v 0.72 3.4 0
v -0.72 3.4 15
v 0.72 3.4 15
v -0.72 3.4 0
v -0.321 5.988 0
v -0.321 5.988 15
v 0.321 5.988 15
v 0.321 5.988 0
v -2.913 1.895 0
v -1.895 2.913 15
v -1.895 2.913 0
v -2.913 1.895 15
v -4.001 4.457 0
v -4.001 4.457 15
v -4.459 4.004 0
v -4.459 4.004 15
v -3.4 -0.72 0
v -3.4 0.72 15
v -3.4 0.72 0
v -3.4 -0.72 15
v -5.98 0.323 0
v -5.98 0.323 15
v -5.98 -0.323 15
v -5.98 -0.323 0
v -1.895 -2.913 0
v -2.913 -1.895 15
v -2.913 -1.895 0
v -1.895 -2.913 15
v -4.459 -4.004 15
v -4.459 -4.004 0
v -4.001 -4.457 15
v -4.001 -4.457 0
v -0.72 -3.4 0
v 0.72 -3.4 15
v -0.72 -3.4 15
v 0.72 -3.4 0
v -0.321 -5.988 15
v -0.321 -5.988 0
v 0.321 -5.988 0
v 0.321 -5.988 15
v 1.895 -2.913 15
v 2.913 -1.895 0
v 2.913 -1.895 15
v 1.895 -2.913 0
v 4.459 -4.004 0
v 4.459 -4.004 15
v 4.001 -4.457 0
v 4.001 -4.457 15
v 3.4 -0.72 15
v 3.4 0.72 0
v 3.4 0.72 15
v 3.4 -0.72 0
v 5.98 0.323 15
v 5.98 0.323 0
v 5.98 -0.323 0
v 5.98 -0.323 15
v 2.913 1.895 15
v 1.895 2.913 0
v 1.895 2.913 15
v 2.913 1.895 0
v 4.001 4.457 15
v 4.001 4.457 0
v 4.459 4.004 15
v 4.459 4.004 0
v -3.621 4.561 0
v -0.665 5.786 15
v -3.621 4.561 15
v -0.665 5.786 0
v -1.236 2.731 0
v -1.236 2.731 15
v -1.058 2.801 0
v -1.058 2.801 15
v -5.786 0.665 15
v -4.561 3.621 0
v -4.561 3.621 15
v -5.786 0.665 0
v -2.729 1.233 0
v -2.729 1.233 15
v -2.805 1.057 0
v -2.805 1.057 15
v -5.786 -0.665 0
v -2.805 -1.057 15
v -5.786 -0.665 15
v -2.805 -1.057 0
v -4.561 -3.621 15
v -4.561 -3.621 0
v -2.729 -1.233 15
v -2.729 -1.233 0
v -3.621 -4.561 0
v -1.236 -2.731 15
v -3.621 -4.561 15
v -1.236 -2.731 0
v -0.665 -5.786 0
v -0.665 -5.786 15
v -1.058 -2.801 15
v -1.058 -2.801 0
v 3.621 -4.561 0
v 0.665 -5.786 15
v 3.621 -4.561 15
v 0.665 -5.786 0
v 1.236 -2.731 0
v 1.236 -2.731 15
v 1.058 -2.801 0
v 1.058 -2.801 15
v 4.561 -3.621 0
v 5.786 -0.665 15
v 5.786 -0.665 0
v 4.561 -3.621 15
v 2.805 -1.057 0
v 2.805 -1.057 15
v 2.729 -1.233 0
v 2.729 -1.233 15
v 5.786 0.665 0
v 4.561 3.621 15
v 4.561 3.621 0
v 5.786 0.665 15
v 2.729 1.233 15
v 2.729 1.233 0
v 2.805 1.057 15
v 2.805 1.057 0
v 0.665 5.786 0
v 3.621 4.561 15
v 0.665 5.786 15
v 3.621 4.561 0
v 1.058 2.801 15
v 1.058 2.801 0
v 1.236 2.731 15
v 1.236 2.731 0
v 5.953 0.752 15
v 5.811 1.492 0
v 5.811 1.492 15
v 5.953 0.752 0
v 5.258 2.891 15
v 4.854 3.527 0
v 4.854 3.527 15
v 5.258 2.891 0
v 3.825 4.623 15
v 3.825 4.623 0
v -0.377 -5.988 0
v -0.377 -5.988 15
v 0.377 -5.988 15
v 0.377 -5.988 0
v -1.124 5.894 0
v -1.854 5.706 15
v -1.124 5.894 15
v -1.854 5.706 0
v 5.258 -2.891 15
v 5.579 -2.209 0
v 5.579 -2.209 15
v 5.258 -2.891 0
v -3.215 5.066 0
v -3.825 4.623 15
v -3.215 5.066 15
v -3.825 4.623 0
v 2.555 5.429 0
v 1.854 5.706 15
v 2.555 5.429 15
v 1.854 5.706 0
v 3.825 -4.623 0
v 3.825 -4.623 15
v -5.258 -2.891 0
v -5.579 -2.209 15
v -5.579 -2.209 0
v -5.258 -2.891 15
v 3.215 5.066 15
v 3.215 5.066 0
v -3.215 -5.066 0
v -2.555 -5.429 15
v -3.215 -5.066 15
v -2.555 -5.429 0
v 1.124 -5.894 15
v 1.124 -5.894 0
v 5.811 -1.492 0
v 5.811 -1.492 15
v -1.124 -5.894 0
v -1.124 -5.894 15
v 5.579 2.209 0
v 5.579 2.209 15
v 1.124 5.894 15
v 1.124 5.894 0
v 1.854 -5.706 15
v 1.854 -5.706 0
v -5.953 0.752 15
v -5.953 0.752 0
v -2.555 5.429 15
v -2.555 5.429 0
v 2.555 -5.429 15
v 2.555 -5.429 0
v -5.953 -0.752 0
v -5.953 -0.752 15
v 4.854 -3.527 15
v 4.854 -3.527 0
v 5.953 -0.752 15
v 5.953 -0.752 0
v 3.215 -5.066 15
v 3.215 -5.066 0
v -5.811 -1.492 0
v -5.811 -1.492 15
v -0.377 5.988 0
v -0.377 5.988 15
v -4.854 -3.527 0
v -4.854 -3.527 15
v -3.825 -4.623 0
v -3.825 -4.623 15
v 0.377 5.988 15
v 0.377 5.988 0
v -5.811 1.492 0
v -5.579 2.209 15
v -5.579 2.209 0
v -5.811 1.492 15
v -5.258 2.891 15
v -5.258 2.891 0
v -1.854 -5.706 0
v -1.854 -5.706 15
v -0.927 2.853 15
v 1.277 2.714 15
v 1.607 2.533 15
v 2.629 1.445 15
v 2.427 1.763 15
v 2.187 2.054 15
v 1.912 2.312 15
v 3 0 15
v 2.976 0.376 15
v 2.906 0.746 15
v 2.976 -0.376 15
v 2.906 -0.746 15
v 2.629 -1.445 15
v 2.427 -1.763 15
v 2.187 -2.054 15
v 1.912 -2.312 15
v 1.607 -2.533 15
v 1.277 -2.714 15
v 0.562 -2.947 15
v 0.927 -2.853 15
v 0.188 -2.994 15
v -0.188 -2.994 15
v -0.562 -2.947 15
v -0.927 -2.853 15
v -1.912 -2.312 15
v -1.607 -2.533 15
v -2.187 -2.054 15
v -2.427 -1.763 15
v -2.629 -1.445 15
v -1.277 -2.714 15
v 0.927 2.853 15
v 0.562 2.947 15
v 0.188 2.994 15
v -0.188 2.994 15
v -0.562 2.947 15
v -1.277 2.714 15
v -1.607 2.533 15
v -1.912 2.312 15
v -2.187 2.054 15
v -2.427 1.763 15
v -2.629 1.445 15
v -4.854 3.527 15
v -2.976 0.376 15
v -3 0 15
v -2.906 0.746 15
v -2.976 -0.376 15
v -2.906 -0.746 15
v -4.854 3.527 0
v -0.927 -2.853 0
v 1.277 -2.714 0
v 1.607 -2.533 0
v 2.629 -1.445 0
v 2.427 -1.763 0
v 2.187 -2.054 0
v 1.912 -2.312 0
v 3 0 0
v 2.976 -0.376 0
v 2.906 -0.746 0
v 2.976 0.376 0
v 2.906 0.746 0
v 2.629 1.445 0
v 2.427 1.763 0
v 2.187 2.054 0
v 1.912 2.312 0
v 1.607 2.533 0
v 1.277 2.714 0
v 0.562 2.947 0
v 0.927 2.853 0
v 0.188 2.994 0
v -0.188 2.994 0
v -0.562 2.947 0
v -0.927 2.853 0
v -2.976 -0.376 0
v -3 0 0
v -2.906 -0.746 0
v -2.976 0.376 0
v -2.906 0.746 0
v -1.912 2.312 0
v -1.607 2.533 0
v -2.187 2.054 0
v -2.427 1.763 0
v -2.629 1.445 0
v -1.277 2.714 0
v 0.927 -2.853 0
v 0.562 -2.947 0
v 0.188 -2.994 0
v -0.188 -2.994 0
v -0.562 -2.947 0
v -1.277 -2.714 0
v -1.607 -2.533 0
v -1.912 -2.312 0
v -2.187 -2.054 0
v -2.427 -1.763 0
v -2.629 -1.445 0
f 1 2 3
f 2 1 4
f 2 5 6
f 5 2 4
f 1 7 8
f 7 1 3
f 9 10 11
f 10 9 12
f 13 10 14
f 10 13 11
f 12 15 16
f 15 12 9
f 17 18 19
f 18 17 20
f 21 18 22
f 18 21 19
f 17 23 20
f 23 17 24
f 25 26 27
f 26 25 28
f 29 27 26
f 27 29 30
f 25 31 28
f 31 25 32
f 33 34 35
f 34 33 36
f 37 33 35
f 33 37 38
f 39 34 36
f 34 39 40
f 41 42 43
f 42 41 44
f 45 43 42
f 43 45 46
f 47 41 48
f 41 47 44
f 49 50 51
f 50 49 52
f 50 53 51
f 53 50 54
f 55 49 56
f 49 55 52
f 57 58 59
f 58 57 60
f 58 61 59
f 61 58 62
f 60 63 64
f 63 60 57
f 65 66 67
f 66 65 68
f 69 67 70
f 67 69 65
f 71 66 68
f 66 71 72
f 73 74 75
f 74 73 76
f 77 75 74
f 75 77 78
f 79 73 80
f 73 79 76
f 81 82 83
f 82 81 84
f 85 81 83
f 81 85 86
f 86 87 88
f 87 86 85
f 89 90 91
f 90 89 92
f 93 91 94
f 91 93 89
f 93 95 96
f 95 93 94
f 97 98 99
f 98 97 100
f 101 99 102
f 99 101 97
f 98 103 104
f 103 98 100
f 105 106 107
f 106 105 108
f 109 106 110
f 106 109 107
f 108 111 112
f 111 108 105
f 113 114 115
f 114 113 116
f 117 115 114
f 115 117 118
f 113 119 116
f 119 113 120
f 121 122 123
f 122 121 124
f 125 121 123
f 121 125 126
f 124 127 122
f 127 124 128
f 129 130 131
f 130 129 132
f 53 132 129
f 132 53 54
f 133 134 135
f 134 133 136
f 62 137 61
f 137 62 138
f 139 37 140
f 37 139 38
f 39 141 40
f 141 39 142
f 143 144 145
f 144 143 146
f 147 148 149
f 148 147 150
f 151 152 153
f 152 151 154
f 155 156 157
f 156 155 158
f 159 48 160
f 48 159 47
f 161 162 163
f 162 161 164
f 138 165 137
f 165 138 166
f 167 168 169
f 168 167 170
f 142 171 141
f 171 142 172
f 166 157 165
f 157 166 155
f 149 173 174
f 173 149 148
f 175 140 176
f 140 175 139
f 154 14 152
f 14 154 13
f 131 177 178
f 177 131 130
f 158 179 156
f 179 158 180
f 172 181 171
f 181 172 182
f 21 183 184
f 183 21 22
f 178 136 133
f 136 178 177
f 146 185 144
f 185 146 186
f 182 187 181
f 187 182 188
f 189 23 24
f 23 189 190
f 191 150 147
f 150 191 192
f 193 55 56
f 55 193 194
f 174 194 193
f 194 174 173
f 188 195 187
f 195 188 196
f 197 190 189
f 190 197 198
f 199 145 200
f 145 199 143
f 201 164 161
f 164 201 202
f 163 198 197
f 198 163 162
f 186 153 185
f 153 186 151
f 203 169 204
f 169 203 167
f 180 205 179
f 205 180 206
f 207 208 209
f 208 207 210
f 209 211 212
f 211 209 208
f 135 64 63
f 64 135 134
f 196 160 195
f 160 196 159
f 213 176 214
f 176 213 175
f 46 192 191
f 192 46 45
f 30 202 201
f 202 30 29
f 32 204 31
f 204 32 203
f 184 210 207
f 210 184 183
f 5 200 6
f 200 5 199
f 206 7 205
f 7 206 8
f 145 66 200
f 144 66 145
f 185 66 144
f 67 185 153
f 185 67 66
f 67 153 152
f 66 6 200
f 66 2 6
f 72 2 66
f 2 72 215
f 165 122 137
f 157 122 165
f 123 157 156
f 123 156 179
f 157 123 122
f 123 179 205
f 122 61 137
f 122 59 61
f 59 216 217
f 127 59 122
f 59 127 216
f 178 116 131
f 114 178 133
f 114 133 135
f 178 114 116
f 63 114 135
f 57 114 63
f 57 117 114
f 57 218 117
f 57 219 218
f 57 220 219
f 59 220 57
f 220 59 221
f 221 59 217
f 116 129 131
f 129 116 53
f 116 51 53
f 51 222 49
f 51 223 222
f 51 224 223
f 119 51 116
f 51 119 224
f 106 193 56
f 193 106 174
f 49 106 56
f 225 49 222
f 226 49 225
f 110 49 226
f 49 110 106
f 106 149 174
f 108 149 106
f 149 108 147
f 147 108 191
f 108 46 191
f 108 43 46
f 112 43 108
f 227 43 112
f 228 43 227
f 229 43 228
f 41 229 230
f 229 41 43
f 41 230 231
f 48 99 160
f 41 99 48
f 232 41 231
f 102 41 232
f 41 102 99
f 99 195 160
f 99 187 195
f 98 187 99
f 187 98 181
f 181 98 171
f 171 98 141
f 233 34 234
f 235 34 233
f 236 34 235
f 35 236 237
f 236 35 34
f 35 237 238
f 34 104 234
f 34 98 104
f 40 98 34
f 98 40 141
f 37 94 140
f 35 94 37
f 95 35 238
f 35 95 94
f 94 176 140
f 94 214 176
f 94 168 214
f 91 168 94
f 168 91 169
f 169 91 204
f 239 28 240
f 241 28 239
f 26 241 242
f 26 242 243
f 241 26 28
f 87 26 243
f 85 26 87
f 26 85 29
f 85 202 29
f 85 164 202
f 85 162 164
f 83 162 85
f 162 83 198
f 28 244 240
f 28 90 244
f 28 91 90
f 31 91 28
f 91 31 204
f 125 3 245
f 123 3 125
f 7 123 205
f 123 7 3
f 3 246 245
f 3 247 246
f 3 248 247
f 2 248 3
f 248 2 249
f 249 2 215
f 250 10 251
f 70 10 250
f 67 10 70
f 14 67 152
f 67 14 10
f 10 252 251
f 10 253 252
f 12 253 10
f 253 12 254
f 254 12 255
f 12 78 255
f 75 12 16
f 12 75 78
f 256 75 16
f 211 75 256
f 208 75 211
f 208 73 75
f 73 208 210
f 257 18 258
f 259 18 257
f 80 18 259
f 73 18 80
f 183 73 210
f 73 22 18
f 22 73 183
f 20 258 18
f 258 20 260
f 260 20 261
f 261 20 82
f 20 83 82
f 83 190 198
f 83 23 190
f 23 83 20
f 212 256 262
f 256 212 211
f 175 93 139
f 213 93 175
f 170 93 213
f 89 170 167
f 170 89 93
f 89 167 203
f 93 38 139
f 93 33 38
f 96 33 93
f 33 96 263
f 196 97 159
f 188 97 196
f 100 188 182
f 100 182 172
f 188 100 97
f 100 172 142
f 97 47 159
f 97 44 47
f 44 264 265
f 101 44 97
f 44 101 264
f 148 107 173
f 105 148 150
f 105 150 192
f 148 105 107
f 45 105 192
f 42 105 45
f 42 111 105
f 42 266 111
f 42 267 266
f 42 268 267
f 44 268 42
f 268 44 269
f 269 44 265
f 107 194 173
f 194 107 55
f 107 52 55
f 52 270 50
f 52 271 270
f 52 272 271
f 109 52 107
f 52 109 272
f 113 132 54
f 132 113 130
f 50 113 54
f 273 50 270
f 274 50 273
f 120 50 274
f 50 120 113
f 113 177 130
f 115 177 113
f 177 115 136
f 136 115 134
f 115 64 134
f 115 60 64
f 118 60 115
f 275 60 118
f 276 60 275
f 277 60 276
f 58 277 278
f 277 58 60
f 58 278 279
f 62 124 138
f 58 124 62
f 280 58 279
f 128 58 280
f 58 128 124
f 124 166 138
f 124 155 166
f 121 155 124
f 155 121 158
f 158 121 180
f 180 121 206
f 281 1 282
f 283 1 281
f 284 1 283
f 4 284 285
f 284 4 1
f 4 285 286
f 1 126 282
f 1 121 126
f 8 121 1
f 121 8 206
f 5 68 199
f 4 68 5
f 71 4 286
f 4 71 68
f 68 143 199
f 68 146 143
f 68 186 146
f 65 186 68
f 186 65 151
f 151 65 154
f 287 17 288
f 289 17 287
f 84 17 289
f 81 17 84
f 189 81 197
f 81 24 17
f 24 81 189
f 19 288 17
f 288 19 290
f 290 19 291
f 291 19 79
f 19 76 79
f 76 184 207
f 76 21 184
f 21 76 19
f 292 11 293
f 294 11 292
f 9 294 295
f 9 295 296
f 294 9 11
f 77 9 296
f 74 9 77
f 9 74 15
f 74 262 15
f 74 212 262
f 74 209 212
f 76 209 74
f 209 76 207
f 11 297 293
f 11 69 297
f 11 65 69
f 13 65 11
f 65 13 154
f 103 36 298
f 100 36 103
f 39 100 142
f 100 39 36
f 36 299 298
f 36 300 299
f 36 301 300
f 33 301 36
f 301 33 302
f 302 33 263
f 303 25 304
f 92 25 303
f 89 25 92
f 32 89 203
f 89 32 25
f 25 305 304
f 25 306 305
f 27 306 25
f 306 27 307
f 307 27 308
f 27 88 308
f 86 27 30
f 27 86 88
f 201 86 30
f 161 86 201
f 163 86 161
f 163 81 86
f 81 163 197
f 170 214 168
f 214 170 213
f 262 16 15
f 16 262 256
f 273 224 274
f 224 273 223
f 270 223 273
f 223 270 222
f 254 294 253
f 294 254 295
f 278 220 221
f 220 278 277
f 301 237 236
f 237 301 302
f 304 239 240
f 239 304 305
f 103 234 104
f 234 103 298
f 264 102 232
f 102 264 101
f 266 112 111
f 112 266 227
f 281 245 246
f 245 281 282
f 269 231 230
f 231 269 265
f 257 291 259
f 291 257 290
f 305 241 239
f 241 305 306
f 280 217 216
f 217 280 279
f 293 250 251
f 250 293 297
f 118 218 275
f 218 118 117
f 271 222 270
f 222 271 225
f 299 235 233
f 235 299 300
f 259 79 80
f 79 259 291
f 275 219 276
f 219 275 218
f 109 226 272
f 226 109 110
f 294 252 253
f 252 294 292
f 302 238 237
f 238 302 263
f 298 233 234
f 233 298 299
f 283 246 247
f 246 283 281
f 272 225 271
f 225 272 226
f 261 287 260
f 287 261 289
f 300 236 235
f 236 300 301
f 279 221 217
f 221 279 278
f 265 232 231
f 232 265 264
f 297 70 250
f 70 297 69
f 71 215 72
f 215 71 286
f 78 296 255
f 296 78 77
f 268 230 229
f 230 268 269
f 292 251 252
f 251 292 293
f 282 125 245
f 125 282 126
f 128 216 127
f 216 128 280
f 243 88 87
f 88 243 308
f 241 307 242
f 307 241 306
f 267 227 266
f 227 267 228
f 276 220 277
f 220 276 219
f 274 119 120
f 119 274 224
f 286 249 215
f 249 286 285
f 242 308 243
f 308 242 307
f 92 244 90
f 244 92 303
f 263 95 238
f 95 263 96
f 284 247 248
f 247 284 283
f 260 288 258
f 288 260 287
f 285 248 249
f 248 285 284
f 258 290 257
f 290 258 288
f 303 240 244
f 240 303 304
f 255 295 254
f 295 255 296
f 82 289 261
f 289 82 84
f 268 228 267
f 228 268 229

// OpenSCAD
module wedge(a,h) {
	p1 = [ 0, cos(a), 0 ];
	p2 = [ sin(a), 0, 0 ];
	p3 = [ -sin(a), 0, 0 ];
	p4 = [ 0, cos(a), h ];
	p5 = [ sin(a), 0, h ];
	p6 = [ -sin(a), 0, h ];
	polyhedron(
		points=[p1, p2, p3, p4, p5, p6],
		triangles=[
			[1,0,2],
			[3,4,5],
			[5,1,2],
			[4,1,5],
			[4,0,1],
			[4,3,0],
			[3,5,0],
			[5,2,0],
		]
	);
}

r1 = 6;
h = 15;
r2 = 5*r1/10;
r3 = r2+0.4;
r4 = r1-0.4;
s = 3.2;

module squeezy() {
	difference() {
		cylinder( r=r1, h=h, $fn=50 );
		translate([0,0,-1]) cylinder( r=r2, h=h+2, $fn=50 );
	
		for( a=[0:45:360] ) {
			rotate(a,[0,0,1])
			translate([0,r3,-1])
			scale([s,1.5*s,1])
			wedge( 13,h+4 );
		}
	
		for( a=[0:45:360] ) {
			rotate(a+45/2,[0,0,1])
			translate([0,r4,-1])
			rotate(180,[0,0,1])
			scale([s,s,1])
			wedge( 30,h+4 );
		}
	}
}

squeezy();
